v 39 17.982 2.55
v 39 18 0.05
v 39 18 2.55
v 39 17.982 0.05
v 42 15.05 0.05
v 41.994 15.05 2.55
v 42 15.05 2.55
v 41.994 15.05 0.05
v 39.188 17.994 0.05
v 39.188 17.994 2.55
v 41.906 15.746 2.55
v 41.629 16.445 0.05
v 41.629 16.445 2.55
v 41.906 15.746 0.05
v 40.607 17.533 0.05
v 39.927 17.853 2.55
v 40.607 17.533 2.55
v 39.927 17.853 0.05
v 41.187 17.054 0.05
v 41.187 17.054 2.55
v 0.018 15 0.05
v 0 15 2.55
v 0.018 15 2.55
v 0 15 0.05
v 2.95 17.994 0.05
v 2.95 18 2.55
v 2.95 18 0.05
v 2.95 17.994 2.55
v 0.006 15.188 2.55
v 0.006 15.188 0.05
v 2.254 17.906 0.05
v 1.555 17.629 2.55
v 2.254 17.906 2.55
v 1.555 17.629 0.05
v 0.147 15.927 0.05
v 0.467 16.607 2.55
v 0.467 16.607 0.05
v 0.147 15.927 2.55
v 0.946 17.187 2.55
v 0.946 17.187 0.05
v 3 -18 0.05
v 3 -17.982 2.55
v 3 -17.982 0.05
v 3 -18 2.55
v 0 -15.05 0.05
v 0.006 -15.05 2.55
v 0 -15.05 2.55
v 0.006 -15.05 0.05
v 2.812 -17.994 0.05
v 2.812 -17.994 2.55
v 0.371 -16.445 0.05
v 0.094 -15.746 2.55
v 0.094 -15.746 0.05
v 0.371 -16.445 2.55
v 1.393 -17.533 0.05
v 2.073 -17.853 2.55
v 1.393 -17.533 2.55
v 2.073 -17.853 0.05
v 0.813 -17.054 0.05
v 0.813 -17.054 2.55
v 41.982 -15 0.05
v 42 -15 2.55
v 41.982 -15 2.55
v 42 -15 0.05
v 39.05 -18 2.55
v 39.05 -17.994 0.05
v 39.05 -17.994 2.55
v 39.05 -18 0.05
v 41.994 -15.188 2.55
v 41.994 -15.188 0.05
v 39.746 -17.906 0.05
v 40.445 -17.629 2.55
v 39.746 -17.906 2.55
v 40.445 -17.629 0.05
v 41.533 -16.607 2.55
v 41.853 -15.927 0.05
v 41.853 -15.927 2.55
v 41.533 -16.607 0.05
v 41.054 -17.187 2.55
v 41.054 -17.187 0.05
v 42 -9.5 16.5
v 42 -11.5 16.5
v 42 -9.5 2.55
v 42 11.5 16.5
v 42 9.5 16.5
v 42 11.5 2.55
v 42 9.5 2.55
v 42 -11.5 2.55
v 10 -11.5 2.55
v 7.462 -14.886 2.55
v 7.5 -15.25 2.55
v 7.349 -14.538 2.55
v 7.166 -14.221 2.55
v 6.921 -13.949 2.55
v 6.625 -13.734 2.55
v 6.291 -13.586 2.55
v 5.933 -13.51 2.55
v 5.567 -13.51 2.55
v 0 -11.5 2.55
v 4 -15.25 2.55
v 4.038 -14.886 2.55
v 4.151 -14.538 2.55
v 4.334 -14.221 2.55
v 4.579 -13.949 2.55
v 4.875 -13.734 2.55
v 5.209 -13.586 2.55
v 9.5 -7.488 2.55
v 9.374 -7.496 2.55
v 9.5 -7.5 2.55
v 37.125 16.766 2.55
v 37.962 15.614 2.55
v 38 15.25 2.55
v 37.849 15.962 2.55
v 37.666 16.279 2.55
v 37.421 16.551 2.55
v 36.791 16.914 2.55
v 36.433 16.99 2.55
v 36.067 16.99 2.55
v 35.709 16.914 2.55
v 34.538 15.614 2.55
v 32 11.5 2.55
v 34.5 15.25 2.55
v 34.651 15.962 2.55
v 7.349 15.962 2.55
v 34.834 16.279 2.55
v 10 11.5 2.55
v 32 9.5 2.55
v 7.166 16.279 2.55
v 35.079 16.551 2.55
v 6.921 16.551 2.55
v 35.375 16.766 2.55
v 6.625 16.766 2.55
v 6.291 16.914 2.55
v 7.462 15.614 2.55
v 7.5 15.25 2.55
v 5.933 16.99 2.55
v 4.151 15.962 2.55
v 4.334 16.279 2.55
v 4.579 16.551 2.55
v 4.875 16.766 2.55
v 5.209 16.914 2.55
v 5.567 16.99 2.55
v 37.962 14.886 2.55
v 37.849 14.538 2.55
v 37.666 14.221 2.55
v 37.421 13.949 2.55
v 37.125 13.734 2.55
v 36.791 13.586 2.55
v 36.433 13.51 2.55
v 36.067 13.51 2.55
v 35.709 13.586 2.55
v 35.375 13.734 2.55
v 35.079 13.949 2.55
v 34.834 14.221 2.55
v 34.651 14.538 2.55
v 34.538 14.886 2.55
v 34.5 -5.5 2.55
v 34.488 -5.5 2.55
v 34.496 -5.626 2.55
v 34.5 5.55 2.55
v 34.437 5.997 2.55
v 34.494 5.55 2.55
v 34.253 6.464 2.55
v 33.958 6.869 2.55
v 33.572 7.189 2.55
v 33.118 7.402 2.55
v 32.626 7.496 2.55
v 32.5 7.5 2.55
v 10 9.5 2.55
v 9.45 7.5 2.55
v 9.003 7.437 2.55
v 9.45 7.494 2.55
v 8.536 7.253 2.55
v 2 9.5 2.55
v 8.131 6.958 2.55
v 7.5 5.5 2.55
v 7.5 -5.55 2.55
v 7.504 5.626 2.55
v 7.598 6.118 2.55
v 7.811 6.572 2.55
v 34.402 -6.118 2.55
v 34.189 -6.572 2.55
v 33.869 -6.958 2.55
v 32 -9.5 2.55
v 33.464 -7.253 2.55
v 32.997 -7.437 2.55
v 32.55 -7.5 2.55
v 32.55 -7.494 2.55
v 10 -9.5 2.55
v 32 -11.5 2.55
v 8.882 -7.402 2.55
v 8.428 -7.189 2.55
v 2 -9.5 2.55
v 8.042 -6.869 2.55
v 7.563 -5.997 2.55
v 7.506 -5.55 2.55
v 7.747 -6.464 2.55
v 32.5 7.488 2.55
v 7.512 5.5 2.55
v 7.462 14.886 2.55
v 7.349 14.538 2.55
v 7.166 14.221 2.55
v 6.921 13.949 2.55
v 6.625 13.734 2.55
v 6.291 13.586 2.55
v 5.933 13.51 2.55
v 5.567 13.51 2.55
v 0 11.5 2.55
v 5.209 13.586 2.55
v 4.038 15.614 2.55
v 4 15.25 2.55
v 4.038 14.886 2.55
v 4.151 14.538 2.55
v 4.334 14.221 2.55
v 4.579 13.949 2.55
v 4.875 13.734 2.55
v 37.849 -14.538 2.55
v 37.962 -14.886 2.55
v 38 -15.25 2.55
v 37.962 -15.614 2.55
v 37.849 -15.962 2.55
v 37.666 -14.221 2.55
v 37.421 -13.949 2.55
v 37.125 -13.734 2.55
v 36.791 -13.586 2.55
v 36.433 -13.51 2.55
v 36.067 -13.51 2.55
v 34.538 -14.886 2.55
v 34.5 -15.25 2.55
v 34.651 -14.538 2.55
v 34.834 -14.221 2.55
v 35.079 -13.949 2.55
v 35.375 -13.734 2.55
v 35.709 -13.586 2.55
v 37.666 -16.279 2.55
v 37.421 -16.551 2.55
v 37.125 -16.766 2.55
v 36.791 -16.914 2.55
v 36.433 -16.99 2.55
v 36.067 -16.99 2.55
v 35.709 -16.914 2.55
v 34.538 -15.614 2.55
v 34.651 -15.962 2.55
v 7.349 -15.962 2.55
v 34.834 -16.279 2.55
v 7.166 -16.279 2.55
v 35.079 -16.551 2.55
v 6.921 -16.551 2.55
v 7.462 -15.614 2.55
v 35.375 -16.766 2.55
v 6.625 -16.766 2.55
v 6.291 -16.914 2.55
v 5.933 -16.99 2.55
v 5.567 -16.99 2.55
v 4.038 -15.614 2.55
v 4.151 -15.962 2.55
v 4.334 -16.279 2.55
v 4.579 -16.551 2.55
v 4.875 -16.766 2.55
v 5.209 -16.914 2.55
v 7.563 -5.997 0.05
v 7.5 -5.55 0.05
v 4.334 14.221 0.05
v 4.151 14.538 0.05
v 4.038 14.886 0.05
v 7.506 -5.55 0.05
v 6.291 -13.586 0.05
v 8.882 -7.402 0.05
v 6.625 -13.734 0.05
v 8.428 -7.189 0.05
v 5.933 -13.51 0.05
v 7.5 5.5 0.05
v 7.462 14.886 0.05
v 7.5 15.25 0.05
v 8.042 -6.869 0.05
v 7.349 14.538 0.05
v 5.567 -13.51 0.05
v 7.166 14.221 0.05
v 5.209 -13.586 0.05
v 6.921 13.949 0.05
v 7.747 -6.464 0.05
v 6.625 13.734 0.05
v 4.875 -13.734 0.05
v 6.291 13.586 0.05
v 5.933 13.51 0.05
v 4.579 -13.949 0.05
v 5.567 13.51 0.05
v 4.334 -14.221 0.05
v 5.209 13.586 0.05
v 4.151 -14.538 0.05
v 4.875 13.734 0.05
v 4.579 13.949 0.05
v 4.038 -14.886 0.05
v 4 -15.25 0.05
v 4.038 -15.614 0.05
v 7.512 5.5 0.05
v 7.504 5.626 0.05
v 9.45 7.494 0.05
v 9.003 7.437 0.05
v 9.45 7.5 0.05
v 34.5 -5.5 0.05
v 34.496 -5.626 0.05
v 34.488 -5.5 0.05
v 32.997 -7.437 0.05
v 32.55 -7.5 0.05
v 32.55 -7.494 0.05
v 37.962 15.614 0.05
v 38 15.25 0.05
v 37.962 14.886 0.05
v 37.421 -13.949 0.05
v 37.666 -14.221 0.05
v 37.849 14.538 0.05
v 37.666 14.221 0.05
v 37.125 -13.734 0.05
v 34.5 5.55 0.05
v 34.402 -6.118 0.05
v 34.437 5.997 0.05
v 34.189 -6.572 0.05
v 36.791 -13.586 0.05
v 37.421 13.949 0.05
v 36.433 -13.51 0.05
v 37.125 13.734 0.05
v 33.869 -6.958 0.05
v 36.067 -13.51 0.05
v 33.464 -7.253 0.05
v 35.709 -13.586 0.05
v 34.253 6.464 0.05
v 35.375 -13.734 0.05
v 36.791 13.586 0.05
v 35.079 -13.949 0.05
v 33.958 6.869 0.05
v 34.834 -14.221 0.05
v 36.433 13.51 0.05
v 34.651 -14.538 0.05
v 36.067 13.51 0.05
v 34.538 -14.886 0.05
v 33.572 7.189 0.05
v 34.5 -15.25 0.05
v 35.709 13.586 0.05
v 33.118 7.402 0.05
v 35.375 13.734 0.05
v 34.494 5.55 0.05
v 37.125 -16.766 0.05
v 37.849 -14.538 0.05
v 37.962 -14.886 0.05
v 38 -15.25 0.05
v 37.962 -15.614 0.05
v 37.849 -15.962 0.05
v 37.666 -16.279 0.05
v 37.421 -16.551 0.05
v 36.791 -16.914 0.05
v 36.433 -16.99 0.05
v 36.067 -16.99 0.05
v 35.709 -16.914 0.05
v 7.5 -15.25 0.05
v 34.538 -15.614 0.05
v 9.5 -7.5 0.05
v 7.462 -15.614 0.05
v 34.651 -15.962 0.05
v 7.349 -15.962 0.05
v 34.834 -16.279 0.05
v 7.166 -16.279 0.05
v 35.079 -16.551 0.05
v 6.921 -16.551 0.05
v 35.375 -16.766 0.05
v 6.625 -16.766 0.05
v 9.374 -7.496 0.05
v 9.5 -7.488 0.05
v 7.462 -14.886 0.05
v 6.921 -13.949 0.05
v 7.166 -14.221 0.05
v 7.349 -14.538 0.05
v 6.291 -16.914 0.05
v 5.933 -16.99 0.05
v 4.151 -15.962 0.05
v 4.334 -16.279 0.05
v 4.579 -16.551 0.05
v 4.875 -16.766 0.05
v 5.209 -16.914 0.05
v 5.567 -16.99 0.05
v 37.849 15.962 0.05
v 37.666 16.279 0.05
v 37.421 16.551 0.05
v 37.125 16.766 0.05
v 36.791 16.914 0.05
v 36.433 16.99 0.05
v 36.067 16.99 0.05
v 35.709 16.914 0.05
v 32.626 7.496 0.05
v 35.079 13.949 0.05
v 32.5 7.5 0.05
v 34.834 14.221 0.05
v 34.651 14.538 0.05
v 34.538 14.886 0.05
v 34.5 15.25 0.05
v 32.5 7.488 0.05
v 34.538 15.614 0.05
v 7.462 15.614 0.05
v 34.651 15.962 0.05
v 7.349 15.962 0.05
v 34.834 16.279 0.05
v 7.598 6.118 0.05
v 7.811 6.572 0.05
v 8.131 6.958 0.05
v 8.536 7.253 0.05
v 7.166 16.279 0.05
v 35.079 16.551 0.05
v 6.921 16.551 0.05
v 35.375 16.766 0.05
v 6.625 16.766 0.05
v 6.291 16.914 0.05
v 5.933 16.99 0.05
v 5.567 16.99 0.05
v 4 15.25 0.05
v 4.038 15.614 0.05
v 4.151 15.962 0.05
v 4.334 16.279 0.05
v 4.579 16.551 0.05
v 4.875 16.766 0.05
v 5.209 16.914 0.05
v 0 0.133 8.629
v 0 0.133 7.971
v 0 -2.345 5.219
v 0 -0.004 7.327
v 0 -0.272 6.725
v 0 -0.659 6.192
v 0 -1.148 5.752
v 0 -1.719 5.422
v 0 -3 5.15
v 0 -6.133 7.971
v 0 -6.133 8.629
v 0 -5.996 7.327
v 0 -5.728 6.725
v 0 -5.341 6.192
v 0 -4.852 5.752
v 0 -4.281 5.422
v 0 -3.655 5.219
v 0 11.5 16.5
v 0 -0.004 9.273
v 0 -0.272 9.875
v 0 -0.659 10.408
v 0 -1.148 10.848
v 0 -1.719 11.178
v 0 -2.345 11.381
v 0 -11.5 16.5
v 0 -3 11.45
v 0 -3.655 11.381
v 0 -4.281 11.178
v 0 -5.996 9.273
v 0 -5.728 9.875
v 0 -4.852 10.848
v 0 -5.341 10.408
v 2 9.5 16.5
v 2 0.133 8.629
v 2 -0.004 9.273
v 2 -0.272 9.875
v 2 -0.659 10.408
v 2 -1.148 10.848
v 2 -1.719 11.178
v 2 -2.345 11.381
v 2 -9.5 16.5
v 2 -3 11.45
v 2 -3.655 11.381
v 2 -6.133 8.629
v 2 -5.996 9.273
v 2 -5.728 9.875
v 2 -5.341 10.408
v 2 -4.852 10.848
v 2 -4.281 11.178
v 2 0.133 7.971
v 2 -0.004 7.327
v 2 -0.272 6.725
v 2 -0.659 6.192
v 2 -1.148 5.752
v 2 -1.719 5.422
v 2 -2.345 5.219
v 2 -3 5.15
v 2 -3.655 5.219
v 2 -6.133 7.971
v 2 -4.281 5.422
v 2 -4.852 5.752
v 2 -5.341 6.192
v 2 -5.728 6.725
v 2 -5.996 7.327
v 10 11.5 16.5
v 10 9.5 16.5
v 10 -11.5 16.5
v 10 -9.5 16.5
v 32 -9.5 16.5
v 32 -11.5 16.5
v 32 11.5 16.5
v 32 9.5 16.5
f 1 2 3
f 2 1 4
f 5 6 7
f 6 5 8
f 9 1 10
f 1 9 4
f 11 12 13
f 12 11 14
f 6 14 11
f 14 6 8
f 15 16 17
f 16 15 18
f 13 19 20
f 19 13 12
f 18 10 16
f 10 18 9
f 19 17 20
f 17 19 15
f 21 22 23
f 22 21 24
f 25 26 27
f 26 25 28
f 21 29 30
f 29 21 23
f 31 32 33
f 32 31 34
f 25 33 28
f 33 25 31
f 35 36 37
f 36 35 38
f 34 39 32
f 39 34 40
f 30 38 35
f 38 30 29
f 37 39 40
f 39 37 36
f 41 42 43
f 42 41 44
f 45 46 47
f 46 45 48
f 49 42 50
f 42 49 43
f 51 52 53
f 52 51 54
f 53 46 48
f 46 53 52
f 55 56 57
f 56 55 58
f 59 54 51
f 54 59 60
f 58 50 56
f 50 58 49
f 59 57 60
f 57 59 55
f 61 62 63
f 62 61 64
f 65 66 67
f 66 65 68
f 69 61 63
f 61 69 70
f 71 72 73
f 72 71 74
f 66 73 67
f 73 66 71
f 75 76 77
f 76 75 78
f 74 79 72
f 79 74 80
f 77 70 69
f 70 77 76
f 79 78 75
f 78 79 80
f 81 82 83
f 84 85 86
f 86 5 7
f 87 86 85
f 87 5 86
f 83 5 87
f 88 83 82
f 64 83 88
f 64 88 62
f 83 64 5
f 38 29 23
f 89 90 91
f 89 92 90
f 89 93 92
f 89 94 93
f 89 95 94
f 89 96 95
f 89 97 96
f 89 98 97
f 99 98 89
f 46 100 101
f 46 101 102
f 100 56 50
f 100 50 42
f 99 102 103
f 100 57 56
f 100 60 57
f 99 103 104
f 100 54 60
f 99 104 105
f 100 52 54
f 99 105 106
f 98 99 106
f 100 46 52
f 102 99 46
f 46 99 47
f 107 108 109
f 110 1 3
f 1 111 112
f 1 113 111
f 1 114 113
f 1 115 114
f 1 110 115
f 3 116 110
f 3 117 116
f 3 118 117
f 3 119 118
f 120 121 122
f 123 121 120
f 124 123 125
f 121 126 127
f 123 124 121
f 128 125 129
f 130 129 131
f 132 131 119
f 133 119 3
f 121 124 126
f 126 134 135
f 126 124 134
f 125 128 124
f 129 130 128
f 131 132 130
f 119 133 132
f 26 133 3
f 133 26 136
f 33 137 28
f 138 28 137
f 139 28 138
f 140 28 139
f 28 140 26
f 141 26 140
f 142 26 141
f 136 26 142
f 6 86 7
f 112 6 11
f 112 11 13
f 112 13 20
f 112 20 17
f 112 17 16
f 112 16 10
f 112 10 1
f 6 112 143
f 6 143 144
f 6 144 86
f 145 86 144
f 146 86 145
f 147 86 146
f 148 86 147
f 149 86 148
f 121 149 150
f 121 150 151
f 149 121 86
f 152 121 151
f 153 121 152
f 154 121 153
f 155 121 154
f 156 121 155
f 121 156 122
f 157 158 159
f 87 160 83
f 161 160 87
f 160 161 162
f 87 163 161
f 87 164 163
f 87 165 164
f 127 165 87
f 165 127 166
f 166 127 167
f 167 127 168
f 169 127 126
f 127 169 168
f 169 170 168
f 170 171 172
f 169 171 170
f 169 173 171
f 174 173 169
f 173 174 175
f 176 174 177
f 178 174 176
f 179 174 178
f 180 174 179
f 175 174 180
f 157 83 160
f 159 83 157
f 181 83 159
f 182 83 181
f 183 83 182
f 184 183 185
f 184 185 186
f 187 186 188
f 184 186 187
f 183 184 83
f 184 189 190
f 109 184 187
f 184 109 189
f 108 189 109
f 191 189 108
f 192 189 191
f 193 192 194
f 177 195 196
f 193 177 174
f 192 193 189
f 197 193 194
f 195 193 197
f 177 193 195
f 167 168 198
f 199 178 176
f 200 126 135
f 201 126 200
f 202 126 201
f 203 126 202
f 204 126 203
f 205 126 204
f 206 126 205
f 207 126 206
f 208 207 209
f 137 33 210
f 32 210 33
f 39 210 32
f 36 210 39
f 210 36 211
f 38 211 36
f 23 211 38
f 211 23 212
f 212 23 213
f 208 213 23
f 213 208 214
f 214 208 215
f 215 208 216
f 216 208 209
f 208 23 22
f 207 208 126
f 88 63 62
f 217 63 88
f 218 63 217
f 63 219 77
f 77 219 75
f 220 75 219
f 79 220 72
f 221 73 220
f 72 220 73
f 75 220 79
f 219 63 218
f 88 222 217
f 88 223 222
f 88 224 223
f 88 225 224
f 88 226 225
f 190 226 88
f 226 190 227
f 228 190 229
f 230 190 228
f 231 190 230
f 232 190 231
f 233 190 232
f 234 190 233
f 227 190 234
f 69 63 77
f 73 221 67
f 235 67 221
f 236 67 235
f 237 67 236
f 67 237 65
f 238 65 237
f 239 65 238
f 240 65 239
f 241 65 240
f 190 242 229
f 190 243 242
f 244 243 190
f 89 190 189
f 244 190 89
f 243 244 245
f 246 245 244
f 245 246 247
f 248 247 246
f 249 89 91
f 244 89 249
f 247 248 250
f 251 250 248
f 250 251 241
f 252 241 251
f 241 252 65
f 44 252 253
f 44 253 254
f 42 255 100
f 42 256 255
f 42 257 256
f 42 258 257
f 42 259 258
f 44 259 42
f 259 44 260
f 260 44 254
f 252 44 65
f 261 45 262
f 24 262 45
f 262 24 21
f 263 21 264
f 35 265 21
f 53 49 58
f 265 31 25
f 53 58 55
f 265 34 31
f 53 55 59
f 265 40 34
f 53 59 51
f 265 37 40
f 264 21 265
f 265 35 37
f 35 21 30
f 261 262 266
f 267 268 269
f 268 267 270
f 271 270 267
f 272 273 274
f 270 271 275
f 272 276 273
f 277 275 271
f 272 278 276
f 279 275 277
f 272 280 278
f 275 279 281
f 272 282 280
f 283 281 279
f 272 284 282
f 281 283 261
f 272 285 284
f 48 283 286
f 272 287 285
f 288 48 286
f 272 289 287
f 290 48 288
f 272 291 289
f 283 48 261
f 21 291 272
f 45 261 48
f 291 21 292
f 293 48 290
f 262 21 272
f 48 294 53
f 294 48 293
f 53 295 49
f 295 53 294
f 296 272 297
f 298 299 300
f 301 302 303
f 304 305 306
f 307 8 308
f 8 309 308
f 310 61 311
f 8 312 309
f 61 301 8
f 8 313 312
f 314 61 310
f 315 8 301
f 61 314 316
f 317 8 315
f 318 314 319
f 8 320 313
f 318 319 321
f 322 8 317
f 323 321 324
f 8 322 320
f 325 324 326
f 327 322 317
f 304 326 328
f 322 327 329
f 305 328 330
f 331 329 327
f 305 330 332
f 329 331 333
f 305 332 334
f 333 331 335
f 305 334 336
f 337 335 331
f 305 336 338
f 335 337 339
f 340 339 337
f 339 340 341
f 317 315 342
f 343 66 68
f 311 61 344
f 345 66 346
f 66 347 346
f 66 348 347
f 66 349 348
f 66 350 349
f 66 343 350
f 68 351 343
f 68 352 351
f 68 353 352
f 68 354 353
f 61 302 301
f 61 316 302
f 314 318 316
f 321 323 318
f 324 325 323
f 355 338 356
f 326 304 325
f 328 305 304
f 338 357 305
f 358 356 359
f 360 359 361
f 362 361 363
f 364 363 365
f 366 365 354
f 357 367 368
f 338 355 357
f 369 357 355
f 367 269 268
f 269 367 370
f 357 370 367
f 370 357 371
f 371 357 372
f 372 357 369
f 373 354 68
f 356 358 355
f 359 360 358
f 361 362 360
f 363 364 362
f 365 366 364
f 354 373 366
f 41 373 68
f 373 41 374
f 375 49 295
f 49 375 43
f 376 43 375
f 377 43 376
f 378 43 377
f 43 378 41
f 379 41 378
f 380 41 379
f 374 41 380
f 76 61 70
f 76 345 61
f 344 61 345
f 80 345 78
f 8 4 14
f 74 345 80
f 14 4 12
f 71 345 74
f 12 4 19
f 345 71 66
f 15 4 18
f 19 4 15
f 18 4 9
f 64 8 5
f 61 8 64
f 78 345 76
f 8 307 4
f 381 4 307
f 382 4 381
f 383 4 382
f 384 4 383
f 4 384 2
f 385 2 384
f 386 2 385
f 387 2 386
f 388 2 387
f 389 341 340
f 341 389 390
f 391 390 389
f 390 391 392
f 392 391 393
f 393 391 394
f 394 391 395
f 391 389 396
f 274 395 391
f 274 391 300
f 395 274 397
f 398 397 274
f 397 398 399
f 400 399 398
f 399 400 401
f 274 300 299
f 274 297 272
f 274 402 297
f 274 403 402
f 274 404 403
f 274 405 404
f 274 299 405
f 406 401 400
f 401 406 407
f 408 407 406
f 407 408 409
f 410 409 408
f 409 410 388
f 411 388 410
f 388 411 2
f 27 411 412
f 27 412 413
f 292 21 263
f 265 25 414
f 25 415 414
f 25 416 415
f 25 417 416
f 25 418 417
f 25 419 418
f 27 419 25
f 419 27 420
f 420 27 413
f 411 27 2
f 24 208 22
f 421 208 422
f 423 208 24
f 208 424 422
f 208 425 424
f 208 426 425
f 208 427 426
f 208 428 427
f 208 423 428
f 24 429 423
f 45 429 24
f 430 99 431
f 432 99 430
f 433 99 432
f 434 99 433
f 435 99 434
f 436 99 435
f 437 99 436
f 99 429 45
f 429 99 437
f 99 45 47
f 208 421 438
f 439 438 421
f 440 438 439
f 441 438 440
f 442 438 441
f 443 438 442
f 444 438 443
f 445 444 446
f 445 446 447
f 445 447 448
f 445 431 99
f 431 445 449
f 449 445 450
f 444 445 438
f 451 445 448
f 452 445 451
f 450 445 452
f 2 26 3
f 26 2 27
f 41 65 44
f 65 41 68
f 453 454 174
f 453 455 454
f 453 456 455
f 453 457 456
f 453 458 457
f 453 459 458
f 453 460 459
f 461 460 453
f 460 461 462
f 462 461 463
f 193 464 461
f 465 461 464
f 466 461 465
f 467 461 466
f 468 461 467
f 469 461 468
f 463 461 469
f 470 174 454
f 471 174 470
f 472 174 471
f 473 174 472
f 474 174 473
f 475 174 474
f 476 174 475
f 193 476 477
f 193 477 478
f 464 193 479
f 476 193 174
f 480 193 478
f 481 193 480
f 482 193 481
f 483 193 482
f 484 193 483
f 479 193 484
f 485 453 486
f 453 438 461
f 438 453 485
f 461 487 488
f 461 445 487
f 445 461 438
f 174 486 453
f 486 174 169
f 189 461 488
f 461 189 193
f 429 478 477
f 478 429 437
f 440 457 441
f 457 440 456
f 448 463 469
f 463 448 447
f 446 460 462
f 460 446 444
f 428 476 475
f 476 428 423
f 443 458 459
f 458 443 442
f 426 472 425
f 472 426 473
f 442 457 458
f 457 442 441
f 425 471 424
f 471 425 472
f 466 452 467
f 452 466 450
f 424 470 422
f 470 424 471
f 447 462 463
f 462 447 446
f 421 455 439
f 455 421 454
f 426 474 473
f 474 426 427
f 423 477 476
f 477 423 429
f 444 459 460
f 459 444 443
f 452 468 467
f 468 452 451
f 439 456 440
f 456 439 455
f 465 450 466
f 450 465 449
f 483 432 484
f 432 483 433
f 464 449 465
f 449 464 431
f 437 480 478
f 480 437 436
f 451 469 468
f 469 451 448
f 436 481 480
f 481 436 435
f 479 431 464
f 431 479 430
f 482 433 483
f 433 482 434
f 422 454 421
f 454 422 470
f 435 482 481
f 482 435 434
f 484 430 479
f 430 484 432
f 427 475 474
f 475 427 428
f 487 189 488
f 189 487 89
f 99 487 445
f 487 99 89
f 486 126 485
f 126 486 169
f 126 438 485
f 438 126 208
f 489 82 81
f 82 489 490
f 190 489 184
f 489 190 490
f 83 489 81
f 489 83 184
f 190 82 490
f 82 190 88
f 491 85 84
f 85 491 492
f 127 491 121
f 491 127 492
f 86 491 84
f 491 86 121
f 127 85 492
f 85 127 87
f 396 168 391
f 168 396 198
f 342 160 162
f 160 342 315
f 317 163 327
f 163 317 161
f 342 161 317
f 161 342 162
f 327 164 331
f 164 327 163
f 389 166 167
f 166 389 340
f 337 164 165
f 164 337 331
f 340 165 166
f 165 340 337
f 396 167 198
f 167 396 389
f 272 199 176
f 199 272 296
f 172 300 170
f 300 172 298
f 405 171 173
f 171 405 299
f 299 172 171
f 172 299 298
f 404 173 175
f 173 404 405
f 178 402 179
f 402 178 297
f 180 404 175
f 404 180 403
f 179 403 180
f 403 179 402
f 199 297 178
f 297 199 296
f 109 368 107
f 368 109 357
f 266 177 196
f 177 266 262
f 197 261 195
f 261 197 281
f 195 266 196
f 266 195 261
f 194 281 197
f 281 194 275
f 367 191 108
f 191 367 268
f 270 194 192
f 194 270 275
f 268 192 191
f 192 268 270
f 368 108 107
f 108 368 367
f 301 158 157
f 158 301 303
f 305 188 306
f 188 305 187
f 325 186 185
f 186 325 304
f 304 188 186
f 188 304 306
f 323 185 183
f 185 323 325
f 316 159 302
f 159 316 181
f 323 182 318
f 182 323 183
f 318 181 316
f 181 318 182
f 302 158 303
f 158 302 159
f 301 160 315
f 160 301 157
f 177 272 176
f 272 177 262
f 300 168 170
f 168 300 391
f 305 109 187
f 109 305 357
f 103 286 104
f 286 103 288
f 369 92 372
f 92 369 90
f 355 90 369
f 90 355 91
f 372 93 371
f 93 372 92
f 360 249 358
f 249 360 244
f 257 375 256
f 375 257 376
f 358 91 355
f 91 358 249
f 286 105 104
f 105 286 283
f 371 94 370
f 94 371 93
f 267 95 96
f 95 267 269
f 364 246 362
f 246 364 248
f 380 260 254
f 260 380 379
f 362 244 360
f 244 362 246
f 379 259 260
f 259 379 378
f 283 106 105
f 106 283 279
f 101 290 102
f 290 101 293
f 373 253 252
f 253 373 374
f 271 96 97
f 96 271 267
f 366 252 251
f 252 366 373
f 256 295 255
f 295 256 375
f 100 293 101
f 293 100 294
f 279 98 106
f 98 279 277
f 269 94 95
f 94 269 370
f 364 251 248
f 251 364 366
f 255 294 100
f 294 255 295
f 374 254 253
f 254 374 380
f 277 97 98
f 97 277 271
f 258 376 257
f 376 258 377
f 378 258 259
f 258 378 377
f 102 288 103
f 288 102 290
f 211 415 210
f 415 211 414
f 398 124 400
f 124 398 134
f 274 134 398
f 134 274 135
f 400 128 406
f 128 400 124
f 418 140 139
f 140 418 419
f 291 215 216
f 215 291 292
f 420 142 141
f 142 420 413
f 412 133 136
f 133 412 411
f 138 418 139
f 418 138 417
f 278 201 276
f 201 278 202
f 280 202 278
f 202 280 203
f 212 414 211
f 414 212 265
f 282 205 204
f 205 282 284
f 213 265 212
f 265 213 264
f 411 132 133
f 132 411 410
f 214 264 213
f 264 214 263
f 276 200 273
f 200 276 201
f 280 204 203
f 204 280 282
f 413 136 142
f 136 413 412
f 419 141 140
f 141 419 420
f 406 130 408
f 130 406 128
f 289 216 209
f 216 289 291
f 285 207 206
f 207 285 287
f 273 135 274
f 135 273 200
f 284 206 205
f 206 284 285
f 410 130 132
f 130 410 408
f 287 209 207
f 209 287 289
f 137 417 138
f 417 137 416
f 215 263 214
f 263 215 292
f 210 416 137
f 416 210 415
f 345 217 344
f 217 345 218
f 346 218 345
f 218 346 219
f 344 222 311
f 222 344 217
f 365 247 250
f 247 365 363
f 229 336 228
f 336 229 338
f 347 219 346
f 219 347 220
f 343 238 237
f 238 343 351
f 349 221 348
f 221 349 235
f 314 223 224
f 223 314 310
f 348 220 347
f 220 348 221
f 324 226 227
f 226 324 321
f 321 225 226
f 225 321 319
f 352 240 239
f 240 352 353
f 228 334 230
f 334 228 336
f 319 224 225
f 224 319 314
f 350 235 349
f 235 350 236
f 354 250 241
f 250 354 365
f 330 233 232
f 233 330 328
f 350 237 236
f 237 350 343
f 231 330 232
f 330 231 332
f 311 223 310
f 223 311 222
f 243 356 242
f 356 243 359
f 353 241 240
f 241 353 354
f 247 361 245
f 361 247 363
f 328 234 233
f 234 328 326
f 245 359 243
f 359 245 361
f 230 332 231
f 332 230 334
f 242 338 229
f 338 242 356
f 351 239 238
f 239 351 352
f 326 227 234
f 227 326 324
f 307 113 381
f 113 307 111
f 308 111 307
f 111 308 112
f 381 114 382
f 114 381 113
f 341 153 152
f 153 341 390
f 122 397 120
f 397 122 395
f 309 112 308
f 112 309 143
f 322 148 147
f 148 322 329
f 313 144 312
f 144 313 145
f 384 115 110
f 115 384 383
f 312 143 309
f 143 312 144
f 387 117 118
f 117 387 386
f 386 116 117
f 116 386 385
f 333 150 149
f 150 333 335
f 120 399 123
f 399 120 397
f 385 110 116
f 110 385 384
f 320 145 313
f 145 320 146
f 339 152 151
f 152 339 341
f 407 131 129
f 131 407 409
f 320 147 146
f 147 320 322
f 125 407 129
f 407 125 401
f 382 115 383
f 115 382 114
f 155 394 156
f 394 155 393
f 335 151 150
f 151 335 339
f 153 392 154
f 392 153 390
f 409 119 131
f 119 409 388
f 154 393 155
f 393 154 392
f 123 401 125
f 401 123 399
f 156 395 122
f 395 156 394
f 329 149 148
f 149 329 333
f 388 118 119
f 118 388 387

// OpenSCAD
// file: library/roundCornersCube.scad
/*
http://codeviewer.org/view/code:1b36 
Copyright (C) 2011 Sergio Vilches
This program is free software: you can redistribute it and/or modify it under the terms of the GNU General Public License as published by the Free Software Foundation, either version 3 of the License, or (at your option) any later version.
This program is distributed in the hope that it will be useful, but WITHOUT ANY WARRANTY; without even the implied warranty of MERCHANTABILITY or FITNESS FOR A PARTICULAR PURPOSE. See the GNU General Public License for more details. You should have received a copy of the GNU General Public License along with this program. If not, see <http://www.gnu.org/licenses/>.
Contact: s.vilches.e@gmail.com


    ----------------------------------------------------------- 
                 Round Corners Cube (Extruded)                
      roundCornersCube(x,y,z,r) Where:                        
         - x = Xdir width                                     
         - y = Ydir width                                     
         - z = Height of the cube                             
         - r = Rounding radious                               
                                                              
      Example: roundCornerCube(10,10,2,1);                    
     *Some times it's needed to use F6 to see good results!   
 	 ----------------------------------------------------------- 
*/
// Test it!
// roundCornersCube(10,5,2,1);


module createMeniscus(h,radius) // This module creates the shape that needs to be substracted from a cube to make its corners rounded.
difference(){        //This shape is basicly the difference between a quarter of cylinder and a cube
   translate([radius/2+0.1,radius/2+0.1,0]){
      cube([radius+0.2,radius+0.1,h+0.2],center=true);         // All that 0.x numbers are to avoid "ghost boundaries" when substracting
   }

   cylinder(h=h+0.2,r=radius,$fn = 25,center=true);
}


module roundCornersCube(x,y,z,r)  // Now we just substract the shape we have created in the four corners
difference(){
   cube([x,y,z], center=true);

translate([x/2-r,y/2-r]){  // We move to the first corner (x,y)
      rotate(0){  
         createMeniscus(z,r); // And substract the meniscus
      }
   }
   translate([-x/2+r,y/2-r]){ // To the second corner (-x,y)
      rotate(90){
         createMeniscus(z,r); // But this time we have to rotate the meniscus 90 deg
      }
   }
      translate([-x/2+r,-y/2+r]){ // ... 
      rotate(180){
         createMeniscus(z,r);
      }
   }
      translate([x/2-r,-y/2+r]){
      rotate(270){
         createMeniscus(z,r);
      }
   }
}
// file: library/nutsnbolts/data-access.scad
// Norm Nuts and Bolts - a OpenSCAD library
// Copyright (C) 2012  Johannes Kneer

// This program is free software: you can redistribute it and/or modify
// it under the terms of the GNU General Public License as published by
// the Free Software Foundation, either version 3 of the License, or
// (at your option) any later version.

// This program is distributed in the hope that it will be useful,
// but WITHOUT ANY WARRANTY; without even the implied warranty of
// MERCHANTABILITY or FITNESS FOR A PARTICULAR PURPOSE.  See the
// GNU General Public License for more details.

// You should have received a copy of the GNU General Public License
// along with this program.  If not, see <http://www.gnu.org/licenses/>.


// DATABASE ACCESS FUNCTIONS AND CONSTANTS



// == CONSTANTS == 

// screw table access keys
_NB_S_DESC            = 0;
_NB_S_FAMKEY			 = 1;
_NB_S_LENGTH          = 2;
_NB_S_NOTHREAD_LENGTH = 3;

_NB_F_DESC			 = 0;
_NB_F_OUTER_DIA       = 1;
_NB_F_INNER_DIA       = 2;
_NB_F_LEAD            = 3; 
_NB_F_KEY             = 4;
_NB_F_KEY_DEPTH       = 5;
_NB_F_HEAD_HEIGHT     = 6;
_NB_F_HEAD_DIA        = 7;
_NB_F_NUT_KEY         = 8;
_NB_F_NUT_HEIGHT      = 9;


// == FUNCTIONS ==

// _get_screw("descriptor")   with descriptor = M8x25
//   find the line for a general object in the data matrix

function _get_screw(n) = data_screw[search([n], data_screw)[0]];
function _get_screw_fam(n) = data_screw_fam[search([_get_screw(n)[_NB_S_FAMKEY]], data_screw_fam)[0]];

function _get_fam(n) = data_screw_fam[search([n], data_screw_fam)[0]];


// _get_XXXXX("descriptor") functions
// find a single property in the database

function _get_desc(n)        = _get_screw(n)[_NB_S_DESC];
function _get_famkey(n)         = _get_screw(n)[_NB_S_FAMKEY];
function _get_length(n)      = _get_screw(n)[_NB_S_LENGTH];
function _get_nt_length(n)   = _get_screw(n)[_NB_S_NOTHREAD_LENGTH];

function _get_outer_dia(n)   = _get_screw_fam(n)[_NB_F_OUTER_DIA];
function _get_inner_dia(n)   = _get_screw_fam(n)[_NB_F_INNER_DIA];
function _get_lead(n)        = _get_screw_fam(n)[_NB_F_LEAD];
function _get_head_height(n) = _get_screw_fam(n)[_NB_F_HEAD_HEIGHT];
function _get_head_dia(n)    = _get_screw_fam(n)[_NB_F_HEAD_DIA];
function _get_nut_key(n)     = _get_screw_fam(n)[_NB_F_NUT_KEY];
function _get_nut_height(n)  = _get_screw_fam(n)[_NB_F_NUT_HEIGHT];
// file: library/videotx.scad
// video transmitter - a OpenSCAD 
// Copyright (C) 2015  Gerard Valade

// This program is free software: you can redistribute it and/or modify
// it under the terms of the GNU General Public License as published by
// the Free Software Foundation, either version 3 of the License, or
// (at your option) any later version.

// This program is distributed in the hope that it will be useful,
// but WITHOUT ANY WARRANTY; without even the implied warranty of
// MERCHANTABILITY or FITNESS FOR A PARTICULAR PURPOSE.  See the
// GNU General Public License for more details.

// You should have received a copy of the GNU General Public License
// along with this program.  If not, see <http://www.gnu.org/licenses/>.

module videoTX($fn = 30)
{
	gold = [0.9, 0.8, 0.2];
	white = [0.9, 0.9, 0.9];
	black = [0.2, 0.2, 0.2];
	module connector(w)
	{
		 difference() {
			color(black)  cube([w, 12, 6.5], center=false);
			color(white) translate([1,-2, 1]) cube([w-2, 10, 4.5], center=false);
		}
	}
		
	translate([0, 0, 0.6]) color([0.4, 0.4, 0.4]) cube([26.24, 38.25, 1.2], center=true);
	translate([0, 0, 1.2]) {
		translate([1, 5, 0]) color(black) cube([11, 11, 5.5], center=false);
		translate([0, -6, 0]) cylinder(d=8.26, h=6);
		translate([8.5, -6, 0]) cylinder(d=6.76, h=6);
	} 
	translate([-12, -12, -10.5]) cube([25, 30, 10.5], center=false);
//	translate([6, 19, -4]) rotate([-90,0,0]) color(gold)  cylinder(d=6.26, h=13);
	translate([7.2, 19, -5]) rotate([-90,0,0]) {
		difference() {
		color(gold)  cylinder(d=6.21, h=13);
		translate([0,0,11]) color(white)  cylinder(d=5, h=3);
		}
		color(gold)  cylinder(d=0.5, h=13);
	} 
	translate([-12, -28, -6.5])  connector(10);
	translate([4, -28, -6.5])  connector(7.8); //color(black)  cube([7.8, 12, 6.5], center=false);
}

//videoTX();
// file: library/frsky.scad
// frsky - a OpenSCAD 
// Copyright (C) 2015  Gerard Valade

// This program is free software: you can redistribute it and/or modify
// it under the terms of the GNU General Public License as published by
// the Free Software Foundation, either version 3 of the License, or
// (at your option) any later version.

// This program is distributed in the hope that it will be useful,
// but WITHOUT ANY WARRANTY; without even the implied warranty of
// MERCHANTABILITY or FITNESS FOR A PARTICULAR PURPOSE.  See the
// GNU General Public License for more details.

// You should have received a copy of the GNU General Public License
// along with this program.  If not, see <http://www.gnu.org/licenses/>.

module frskyD4R($fn = 4)
{
	module connector()
	{
		//translate([31.12/2, -3, 2.5]) color([0.9, 0.8, 0.2])
		color([0.2, 0.2, 0.2]) cube([2.5, 15, 5], center=false);
		translate([0, 1, 1]) color([0.9, 0.8, 0.2])
			for (y=[0:5]) {
				translate([0, y*2.54, 0]) rotate([0, 90, 0]) cylinder(d=.6, h=8.5);
				translate([0, y*2.54, 2.54]) rotate([0, 90, 0]) cylinder(d=.6, h=8.5);
			}
		
	}
	module telemetryPort()
	{
		color([0.9,0.9,0.9])
		difference() { 
			cube([7.5, 4.5, 3.0], center=true);
			cube([7, 5, 2.5], center=true);
		
		}
		color([0.9, 0.8, 0.2]) for (x=[0:3]) {
			translate([x*1.25-1.9, 2.8, 0]) rotate([90, 0, 0]) cylinder(d=.5, h=5);
		}
		
	}

	difference() {	
		translate([0, 0, 7.34/2]) color([0.4, 0.4, 0.4]) cube([31.12, 23.16, 7.34], center=true);
		translate([11.9, -9.5, 6.0]) 
				cube([7.5, 4.5, 3.0], center=true);
	}
	translate([11.9, -9.5, 6.0]) telemetryPort();	
	translate([31.12/2, -7.34, 2]) connector();

}

frskyD4R();
// main file
// tarot 680 pro mounting plate - a OpenSCAD 
// Copyright (C) 2015  Gerard Valade

// This program is free software: you can redistribute it and/or modify
// it under the terms of the GNU General Public License as published by
// the Free Software Foundation, either version 3 of the License, or
// (at your option) any later version.

// This program is distributed in the hope that it will be useful,
// but WITHOUT ANY WARRANTY; without even the implied warranty of
// MERCHANTABILITY or FITNESS FOR A PARTICULAR PURPOSE.  See the
// GNU General Public License for more details.

// You should have received a copy of the GNU General Public License
// along with this program.  If not, see <http://www.gnu.org/licenses/>.


include <library/tarot680Modules.scad>
 
translate([0, 0, 0]) tarot680Modules(ViewVideoBracket);
 
